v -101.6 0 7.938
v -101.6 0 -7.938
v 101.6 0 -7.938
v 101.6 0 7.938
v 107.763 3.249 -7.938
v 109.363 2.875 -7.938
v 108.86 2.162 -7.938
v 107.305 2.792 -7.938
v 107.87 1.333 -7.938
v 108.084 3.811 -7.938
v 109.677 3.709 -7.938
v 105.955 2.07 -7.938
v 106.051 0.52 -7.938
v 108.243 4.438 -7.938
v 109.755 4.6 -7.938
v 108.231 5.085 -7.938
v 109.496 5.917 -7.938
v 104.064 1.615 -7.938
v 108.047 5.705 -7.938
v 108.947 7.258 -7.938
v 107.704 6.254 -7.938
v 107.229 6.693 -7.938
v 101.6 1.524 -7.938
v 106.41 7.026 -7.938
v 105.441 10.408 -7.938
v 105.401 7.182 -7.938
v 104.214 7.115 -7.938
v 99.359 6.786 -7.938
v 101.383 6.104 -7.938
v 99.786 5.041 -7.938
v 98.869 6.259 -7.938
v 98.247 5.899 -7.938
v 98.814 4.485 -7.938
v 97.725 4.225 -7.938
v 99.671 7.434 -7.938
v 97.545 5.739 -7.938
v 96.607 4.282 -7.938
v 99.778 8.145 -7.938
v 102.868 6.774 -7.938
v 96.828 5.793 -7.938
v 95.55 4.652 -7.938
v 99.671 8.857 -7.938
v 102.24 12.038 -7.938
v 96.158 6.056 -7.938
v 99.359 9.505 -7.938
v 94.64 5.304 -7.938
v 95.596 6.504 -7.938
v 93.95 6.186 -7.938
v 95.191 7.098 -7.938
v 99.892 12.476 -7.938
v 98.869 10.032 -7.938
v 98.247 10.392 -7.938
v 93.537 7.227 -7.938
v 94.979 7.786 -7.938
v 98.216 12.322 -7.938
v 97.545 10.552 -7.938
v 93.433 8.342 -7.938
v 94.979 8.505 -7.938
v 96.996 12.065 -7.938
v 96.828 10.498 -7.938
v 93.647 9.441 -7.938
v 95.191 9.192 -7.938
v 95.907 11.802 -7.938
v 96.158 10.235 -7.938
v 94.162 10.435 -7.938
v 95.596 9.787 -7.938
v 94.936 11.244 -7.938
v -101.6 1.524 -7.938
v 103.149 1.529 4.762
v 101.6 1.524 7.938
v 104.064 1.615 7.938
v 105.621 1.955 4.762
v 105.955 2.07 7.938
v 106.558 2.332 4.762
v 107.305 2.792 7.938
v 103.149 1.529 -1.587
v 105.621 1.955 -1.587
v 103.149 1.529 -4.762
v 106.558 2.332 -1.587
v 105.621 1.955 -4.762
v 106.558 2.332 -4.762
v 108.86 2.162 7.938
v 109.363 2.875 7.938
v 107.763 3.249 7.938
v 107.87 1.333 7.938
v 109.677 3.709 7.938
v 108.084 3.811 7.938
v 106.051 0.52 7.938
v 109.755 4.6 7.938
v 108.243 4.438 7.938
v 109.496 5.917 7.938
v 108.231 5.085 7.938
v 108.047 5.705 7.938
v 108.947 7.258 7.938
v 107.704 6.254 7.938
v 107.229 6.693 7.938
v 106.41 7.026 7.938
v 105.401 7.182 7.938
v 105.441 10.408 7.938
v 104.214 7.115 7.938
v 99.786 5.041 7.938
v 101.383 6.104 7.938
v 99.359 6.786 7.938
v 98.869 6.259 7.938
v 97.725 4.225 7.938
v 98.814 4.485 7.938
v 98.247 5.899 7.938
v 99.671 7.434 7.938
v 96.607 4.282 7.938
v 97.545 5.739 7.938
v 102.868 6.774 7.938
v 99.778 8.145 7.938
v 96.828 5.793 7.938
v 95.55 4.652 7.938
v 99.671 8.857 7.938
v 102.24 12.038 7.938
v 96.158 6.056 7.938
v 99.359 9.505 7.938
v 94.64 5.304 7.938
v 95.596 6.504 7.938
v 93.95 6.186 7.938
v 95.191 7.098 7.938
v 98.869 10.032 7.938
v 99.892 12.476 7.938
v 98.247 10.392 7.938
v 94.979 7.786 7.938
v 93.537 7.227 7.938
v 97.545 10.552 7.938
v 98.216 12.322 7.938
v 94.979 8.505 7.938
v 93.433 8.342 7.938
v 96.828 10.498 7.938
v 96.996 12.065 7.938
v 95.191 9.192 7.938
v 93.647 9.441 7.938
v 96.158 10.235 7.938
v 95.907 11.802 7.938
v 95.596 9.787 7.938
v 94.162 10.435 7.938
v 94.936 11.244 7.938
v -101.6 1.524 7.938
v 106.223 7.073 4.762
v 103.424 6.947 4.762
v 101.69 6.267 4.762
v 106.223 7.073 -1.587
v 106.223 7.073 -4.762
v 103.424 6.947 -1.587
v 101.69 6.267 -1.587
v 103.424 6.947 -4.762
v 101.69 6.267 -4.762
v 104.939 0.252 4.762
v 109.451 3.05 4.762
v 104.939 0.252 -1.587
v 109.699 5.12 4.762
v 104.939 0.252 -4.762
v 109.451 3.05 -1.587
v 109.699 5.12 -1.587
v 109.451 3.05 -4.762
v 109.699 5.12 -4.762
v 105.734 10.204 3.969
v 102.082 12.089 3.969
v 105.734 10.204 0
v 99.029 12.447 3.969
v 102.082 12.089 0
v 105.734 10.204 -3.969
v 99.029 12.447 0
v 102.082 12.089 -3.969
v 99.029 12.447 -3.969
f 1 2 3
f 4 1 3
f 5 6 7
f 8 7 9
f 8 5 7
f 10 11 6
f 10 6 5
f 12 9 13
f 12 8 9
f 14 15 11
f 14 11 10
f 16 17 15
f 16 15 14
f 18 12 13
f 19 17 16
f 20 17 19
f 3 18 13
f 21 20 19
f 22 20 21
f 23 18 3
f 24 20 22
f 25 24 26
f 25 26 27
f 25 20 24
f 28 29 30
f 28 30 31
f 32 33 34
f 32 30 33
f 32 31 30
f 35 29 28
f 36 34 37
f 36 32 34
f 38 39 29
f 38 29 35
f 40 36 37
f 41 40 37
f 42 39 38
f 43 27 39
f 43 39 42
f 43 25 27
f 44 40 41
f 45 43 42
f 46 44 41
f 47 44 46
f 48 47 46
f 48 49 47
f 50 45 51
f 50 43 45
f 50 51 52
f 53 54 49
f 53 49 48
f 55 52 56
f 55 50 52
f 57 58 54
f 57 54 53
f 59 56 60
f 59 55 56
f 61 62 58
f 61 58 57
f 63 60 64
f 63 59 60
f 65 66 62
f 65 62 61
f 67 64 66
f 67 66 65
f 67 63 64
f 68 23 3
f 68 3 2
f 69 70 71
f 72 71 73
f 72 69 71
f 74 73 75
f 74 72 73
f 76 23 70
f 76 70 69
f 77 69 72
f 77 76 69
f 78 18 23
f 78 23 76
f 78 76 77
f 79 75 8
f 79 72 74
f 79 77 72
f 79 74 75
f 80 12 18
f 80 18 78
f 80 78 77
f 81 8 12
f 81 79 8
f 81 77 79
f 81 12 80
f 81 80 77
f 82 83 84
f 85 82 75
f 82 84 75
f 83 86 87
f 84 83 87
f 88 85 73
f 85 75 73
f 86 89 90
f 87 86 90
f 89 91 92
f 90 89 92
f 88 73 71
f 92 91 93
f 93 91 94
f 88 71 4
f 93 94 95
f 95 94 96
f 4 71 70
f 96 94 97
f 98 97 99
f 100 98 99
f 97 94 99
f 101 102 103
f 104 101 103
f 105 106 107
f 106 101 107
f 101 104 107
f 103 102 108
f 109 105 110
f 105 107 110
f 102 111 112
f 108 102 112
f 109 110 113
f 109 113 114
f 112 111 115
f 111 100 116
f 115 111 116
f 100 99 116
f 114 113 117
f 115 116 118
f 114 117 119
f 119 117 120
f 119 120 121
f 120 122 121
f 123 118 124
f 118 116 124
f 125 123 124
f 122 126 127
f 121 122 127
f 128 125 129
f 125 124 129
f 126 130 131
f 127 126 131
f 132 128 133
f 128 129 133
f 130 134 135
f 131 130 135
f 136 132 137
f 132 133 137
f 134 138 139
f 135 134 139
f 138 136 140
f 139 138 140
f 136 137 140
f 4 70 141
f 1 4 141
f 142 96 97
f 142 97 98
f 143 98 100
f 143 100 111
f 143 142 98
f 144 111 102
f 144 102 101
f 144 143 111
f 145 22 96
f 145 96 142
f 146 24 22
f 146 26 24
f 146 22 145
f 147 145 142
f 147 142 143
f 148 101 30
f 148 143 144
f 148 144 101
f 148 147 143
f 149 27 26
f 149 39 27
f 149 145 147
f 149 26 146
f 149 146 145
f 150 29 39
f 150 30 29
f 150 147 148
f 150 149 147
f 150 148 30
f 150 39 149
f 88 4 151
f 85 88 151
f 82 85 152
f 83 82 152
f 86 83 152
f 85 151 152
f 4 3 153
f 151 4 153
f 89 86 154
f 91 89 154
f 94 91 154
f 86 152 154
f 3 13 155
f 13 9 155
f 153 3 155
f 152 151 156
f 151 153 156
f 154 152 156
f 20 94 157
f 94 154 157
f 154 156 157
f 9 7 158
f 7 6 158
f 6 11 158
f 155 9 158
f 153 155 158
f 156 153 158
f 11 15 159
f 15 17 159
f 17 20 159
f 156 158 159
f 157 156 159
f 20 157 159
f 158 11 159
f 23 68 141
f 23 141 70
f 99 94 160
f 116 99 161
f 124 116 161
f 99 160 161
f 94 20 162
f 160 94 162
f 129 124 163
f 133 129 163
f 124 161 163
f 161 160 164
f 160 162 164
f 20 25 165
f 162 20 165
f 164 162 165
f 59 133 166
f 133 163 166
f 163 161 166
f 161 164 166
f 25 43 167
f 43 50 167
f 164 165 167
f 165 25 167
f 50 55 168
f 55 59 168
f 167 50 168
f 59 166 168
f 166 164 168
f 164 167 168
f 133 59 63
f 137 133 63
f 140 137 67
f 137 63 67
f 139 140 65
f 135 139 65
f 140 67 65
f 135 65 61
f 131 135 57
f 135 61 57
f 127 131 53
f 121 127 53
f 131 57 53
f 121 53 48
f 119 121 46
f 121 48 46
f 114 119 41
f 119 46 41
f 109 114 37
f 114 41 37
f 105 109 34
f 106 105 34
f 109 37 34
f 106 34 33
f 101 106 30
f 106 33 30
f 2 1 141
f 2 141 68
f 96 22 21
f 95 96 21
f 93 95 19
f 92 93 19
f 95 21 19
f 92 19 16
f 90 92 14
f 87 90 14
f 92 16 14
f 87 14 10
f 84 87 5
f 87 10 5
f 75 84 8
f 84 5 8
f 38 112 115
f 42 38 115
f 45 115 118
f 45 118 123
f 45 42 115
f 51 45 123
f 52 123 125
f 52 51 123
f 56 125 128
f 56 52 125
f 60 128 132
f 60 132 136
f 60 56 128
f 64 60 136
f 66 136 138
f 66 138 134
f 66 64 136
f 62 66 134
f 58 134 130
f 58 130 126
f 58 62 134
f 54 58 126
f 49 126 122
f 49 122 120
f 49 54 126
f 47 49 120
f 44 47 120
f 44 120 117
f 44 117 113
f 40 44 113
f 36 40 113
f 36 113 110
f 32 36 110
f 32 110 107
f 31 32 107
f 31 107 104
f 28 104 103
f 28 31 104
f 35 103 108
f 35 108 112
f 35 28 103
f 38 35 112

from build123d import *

# Parameters (mm, degrees)
SKETCH1_W               = 203.2
SKETCH1_H               = 15.875
BOSS_EXTRUDE1_DEPTH     = 1.524
BOSS_EXTRUDE2_START     = -15.875
BOSS_EXTRUDE2_OUTLINE_R = 2.413
BOSS_EXTRUDE2_DEPTH     = 15.875


# Read off the part's stored shape, not the designer's step: Boss-Extrude2
with BuildPart() as part:
    # Sketch1 → Boss-Extrude1 (new body)
    with BuildSketch(Plane(origin=(0, 0, 0), x_dir=(1, 0, 0), z_dir=(0, 1, 0))):
        Rectangle(SKETCH1_W, SKETCH1_H)
    extrude(amount=BOSS_EXTRUDE1_DEPTH)

    # Boss-Extrude2 outline → Boss-Extrude2 (add)
    with BuildSketch(Plane.XY.offset(7.9375).offset(BOSS_EXTRUDE2_START)):
        with BuildLine():
            add(Edge.make_bspline(
                [(107.228546138, 6.692607406), (106.366027923, 7.18125968), (105.140033894, 7.42790314), (103.583408394, 7.287922485), (101.756786703, 6.577932625), (99.786331846, 5.041015057)],
                knots=[0, 0, 0, 0, 0, 0, 1, 1, 1, 1, 1, 1], degree=5))
            ThreePointArc((107.228546138, 6.692607406), (108.258782429, 4.761783473), (107.30453503, 2.792296286))
            add(Edge.make_bspline(
                [(101.6, 1.524), (103.258114517, 1.448306251), (104.638933259, 1.583946831), (105.766741539, 1.881154947), (106.652889556, 2.297992507), (107.30453503, 2.792296286)],
                knots=[0, 0, 0, 0, 0, 0, 1, 1, 1, 1, 1, 1], degree=5))
            Line((101.6, 1.524), (101.6, 0))
            add(Edge.make_bspline(
                [(101.6, 0), (104.748480566, -0.003746591), (109.050367624, 0.259943099), (110.73800353, 3.235869603), (109.946934459, 5.044027479), (108.94689031, 7.25796652)],
                knots=[0, 0, 0, 0, 0, 0, 1, 1, 1, 1, 1, 1], degree=5))
            add(Edge.make_bspline(
                [(108.94689031, 7.25796652), (106.455515071, 10.263008134), (101.235622898, 14.016404122), (98.534099755, 12.238404022), (96.99562172, 12.065011937)],
                knots=[0, 0, 0, 0, 0, 1, 1, 1, 1, 1], degree=4))
            ThreePointArc((96.99562172, 12.065011937), (93.706192437, 6.691697876), (99.786331846, 5.041015057))
        make_face()
        with Locations((97.364988112, 8.145377073)):
            Circle(BOSS_EXTRUDE2_OUTLINE_R, mode=Mode.SUBTRACT)
    extrude(amount=BOSS_EXTRUDE2_DEPTH)


solid = part.part
